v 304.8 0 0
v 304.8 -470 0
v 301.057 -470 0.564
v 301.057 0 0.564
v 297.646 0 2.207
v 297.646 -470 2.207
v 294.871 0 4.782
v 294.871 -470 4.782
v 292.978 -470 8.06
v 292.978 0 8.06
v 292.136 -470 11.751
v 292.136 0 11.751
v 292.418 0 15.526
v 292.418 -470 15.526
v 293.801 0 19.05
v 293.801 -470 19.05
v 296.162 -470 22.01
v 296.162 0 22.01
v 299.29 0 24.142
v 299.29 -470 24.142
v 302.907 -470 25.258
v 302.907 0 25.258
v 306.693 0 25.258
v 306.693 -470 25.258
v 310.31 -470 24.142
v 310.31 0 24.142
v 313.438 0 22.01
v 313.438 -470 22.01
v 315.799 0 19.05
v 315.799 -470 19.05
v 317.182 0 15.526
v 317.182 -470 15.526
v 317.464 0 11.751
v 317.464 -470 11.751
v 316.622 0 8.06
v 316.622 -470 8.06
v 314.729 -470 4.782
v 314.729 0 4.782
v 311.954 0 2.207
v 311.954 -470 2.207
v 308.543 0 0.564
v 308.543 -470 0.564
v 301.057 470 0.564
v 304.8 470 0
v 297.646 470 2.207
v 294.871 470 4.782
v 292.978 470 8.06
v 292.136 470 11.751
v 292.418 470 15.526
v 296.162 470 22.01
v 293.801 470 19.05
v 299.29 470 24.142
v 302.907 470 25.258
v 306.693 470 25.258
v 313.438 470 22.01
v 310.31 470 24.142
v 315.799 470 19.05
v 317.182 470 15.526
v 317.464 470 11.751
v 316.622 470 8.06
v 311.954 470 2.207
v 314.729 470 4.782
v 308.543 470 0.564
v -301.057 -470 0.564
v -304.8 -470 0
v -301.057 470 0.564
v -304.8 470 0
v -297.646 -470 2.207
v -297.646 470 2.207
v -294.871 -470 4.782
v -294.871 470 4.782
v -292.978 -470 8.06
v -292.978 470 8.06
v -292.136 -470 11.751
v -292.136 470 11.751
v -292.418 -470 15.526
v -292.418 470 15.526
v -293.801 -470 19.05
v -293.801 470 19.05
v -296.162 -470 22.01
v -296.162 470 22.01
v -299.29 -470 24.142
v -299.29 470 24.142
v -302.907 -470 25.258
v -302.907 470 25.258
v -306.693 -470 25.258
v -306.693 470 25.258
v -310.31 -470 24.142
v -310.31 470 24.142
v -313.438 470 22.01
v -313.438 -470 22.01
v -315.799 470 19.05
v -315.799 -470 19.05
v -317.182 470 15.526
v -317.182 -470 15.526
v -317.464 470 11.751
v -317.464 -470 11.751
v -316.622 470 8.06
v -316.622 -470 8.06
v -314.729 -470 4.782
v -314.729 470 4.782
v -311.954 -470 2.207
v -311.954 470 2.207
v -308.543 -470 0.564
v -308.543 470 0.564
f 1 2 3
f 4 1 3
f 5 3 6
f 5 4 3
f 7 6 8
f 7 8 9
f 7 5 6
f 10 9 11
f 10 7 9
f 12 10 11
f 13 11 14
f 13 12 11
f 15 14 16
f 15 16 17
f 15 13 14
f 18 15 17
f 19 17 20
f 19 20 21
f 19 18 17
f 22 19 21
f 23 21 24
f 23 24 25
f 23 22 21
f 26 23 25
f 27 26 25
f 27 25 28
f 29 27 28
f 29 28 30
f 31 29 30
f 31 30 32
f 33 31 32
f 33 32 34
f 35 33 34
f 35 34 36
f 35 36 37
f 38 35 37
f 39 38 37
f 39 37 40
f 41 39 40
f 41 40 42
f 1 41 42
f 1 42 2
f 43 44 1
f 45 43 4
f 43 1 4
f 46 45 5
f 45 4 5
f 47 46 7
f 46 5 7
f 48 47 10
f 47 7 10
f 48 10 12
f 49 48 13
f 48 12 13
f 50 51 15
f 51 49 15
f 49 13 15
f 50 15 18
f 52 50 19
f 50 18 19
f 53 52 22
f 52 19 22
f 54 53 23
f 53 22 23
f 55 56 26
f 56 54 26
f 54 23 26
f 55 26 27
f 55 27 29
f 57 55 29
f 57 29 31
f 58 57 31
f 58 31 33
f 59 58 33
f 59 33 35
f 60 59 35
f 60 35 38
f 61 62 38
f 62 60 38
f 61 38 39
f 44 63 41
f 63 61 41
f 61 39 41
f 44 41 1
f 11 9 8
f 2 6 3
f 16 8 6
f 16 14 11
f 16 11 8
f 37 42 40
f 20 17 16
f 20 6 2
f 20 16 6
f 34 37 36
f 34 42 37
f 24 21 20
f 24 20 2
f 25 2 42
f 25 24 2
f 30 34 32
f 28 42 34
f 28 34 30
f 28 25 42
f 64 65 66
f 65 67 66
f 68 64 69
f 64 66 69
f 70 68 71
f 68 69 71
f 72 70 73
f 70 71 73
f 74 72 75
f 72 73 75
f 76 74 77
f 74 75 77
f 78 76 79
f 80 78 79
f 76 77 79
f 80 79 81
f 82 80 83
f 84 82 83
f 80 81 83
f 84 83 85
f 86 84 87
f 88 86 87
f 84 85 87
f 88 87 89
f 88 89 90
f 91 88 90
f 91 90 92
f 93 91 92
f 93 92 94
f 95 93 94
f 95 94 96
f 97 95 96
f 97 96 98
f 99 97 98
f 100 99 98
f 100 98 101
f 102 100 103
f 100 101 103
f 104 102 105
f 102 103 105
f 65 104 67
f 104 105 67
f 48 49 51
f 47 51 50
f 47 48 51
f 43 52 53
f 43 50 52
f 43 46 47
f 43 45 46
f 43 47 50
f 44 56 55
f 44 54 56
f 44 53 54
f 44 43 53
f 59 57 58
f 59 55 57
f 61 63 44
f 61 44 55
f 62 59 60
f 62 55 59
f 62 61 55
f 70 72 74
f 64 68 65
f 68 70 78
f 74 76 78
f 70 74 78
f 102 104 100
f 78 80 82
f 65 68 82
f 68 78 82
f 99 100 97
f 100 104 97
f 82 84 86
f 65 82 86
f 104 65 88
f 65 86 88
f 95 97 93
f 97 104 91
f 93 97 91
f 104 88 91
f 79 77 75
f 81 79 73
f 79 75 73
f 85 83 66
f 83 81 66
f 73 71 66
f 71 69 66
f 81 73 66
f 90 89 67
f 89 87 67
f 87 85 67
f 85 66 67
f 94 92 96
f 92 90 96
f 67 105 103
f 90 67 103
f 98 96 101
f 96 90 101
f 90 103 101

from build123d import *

# Parameters (mm, degrees)
SKETCH1_W                       = 575
SKETCH1_H                       = 940
SKETCH1_W_2                     = 480
SKETCH1_H_2                     = 370
BOSS_EXTRUDE1_DEPTH             = 12
BOSS_EXTRUDE2_REACH             = 553.09
SKETCH2_R                       = 12.7
BOSS_EXTRUDE2_DIRECTION_2_REACH = 553.09
SKETCH3_W                       = 575
SKETCH3_H                       = 940
CUT_EXTRUDE2_DEPTH              = 568.759993307


with BuildPart() as part:
    # Sketch1 → Boss-Extrude1 (new body)
    with BuildSketch(Plane.XY):
        Rectangle(SKETCH1_W, SKETCH1_H)
        with Locations((0, 245)):
            Rectangle(SKETCH1_W_2, SKETCH1_H_2, mode=Mode.SUBTRACT)
    extrude(amount=BOSS_EXTRUDE1_DEPTH)


with BuildPart() as body_2:

    # Boss-Extrude2: up to this face of the body (flat: up to its plane)
    boss_extrude2_end = Plane(part.part.faces().sort_by_distance((0, 470, 6))[0])
    # Sketch2 → Boss-Extrude2 (new, up to the picked face)
    with BuildSketch(Plane(origin=(0, 0, 0), x_dir=(1, 0, 0), z_dir=(0, 1, 0)), mode=Mode.PRIVATE) as boss_extrude2_sk1:
        with Locations(Location((304.8, -12.7, 0), (0, 0, 90))):
            Circle(SKETCH2_R)
    boss_extrude2_tool1 = split(extrude(boss_extrude2_sk1.sketch, amount=BOSS_EXTRUDE2_REACH, mode=Mode.PRIVATE), bisect_by=boss_extrude2_end, keep=Keep.BOTH, mode=Mode.PRIVATE)
    add(boss_extrude2_tool1.solids().sort_by(Axis((304.8, 0, 12.7), (0, 1, 0)))[0])


    # Boss-Extrude2 direction 2: up to this face of the body (flat: up to its plane)
    boss_extrude2_direction_2_end = Plane(part.part.faces().sort_by_distance((0, -470, 6))[0])
    # Sketch2 → Boss-Extrude2 direction 2 (add, up to the picked face)
    with BuildSketch(Plane(origin=(0, 0, 0), x_dir=(1, 0, 0), z_dir=(0, 1, 0)), mode=Mode.PRIVATE) as boss_extrude2_direction_2_sk1:
        with Locations(Location((304.8, -12.7, 0), (0, 0, 90))):
            Circle(SKETCH2_R)
    boss_extrude2_direction_2_tool1 = split(extrude(boss_extrude2_direction_2_sk1.sketch, amount=-BOSS_EXTRUDE2_DIRECTION_2_REACH, mode=Mode.PRIVATE), bisect_by=boss_extrude2_direction_2_end, keep=Keep.BOTH, mode=Mode.PRIVATE)
    add(boss_extrude2_direction_2_tool1.solids().sort_by(Axis((304.8, 0, 12.7), (0, -1, 0)))[0])


with BuildPart() as part_1:
    add(part.part)

    # Sketch3 → Cut-Extrude2 (cut, through all)
    with BuildSketch(Plane.XY):
        Rectangle(SKETCH3_W, SKETCH3_H)
    extrude(amount=CUT_EXTRUDE2_DEPTH, mode=Mode.SUBTRACT)


with BuildPart() as body_2_2:
    # Mirror2: mirrored copy
    add(body_2.part.mirror(Plane(origin=(0, 0, 0), x_dir=(0, 0, 1), z_dir=(1, 0, 0))))


solid = Compound([body_2.part, body_2_2.part])
